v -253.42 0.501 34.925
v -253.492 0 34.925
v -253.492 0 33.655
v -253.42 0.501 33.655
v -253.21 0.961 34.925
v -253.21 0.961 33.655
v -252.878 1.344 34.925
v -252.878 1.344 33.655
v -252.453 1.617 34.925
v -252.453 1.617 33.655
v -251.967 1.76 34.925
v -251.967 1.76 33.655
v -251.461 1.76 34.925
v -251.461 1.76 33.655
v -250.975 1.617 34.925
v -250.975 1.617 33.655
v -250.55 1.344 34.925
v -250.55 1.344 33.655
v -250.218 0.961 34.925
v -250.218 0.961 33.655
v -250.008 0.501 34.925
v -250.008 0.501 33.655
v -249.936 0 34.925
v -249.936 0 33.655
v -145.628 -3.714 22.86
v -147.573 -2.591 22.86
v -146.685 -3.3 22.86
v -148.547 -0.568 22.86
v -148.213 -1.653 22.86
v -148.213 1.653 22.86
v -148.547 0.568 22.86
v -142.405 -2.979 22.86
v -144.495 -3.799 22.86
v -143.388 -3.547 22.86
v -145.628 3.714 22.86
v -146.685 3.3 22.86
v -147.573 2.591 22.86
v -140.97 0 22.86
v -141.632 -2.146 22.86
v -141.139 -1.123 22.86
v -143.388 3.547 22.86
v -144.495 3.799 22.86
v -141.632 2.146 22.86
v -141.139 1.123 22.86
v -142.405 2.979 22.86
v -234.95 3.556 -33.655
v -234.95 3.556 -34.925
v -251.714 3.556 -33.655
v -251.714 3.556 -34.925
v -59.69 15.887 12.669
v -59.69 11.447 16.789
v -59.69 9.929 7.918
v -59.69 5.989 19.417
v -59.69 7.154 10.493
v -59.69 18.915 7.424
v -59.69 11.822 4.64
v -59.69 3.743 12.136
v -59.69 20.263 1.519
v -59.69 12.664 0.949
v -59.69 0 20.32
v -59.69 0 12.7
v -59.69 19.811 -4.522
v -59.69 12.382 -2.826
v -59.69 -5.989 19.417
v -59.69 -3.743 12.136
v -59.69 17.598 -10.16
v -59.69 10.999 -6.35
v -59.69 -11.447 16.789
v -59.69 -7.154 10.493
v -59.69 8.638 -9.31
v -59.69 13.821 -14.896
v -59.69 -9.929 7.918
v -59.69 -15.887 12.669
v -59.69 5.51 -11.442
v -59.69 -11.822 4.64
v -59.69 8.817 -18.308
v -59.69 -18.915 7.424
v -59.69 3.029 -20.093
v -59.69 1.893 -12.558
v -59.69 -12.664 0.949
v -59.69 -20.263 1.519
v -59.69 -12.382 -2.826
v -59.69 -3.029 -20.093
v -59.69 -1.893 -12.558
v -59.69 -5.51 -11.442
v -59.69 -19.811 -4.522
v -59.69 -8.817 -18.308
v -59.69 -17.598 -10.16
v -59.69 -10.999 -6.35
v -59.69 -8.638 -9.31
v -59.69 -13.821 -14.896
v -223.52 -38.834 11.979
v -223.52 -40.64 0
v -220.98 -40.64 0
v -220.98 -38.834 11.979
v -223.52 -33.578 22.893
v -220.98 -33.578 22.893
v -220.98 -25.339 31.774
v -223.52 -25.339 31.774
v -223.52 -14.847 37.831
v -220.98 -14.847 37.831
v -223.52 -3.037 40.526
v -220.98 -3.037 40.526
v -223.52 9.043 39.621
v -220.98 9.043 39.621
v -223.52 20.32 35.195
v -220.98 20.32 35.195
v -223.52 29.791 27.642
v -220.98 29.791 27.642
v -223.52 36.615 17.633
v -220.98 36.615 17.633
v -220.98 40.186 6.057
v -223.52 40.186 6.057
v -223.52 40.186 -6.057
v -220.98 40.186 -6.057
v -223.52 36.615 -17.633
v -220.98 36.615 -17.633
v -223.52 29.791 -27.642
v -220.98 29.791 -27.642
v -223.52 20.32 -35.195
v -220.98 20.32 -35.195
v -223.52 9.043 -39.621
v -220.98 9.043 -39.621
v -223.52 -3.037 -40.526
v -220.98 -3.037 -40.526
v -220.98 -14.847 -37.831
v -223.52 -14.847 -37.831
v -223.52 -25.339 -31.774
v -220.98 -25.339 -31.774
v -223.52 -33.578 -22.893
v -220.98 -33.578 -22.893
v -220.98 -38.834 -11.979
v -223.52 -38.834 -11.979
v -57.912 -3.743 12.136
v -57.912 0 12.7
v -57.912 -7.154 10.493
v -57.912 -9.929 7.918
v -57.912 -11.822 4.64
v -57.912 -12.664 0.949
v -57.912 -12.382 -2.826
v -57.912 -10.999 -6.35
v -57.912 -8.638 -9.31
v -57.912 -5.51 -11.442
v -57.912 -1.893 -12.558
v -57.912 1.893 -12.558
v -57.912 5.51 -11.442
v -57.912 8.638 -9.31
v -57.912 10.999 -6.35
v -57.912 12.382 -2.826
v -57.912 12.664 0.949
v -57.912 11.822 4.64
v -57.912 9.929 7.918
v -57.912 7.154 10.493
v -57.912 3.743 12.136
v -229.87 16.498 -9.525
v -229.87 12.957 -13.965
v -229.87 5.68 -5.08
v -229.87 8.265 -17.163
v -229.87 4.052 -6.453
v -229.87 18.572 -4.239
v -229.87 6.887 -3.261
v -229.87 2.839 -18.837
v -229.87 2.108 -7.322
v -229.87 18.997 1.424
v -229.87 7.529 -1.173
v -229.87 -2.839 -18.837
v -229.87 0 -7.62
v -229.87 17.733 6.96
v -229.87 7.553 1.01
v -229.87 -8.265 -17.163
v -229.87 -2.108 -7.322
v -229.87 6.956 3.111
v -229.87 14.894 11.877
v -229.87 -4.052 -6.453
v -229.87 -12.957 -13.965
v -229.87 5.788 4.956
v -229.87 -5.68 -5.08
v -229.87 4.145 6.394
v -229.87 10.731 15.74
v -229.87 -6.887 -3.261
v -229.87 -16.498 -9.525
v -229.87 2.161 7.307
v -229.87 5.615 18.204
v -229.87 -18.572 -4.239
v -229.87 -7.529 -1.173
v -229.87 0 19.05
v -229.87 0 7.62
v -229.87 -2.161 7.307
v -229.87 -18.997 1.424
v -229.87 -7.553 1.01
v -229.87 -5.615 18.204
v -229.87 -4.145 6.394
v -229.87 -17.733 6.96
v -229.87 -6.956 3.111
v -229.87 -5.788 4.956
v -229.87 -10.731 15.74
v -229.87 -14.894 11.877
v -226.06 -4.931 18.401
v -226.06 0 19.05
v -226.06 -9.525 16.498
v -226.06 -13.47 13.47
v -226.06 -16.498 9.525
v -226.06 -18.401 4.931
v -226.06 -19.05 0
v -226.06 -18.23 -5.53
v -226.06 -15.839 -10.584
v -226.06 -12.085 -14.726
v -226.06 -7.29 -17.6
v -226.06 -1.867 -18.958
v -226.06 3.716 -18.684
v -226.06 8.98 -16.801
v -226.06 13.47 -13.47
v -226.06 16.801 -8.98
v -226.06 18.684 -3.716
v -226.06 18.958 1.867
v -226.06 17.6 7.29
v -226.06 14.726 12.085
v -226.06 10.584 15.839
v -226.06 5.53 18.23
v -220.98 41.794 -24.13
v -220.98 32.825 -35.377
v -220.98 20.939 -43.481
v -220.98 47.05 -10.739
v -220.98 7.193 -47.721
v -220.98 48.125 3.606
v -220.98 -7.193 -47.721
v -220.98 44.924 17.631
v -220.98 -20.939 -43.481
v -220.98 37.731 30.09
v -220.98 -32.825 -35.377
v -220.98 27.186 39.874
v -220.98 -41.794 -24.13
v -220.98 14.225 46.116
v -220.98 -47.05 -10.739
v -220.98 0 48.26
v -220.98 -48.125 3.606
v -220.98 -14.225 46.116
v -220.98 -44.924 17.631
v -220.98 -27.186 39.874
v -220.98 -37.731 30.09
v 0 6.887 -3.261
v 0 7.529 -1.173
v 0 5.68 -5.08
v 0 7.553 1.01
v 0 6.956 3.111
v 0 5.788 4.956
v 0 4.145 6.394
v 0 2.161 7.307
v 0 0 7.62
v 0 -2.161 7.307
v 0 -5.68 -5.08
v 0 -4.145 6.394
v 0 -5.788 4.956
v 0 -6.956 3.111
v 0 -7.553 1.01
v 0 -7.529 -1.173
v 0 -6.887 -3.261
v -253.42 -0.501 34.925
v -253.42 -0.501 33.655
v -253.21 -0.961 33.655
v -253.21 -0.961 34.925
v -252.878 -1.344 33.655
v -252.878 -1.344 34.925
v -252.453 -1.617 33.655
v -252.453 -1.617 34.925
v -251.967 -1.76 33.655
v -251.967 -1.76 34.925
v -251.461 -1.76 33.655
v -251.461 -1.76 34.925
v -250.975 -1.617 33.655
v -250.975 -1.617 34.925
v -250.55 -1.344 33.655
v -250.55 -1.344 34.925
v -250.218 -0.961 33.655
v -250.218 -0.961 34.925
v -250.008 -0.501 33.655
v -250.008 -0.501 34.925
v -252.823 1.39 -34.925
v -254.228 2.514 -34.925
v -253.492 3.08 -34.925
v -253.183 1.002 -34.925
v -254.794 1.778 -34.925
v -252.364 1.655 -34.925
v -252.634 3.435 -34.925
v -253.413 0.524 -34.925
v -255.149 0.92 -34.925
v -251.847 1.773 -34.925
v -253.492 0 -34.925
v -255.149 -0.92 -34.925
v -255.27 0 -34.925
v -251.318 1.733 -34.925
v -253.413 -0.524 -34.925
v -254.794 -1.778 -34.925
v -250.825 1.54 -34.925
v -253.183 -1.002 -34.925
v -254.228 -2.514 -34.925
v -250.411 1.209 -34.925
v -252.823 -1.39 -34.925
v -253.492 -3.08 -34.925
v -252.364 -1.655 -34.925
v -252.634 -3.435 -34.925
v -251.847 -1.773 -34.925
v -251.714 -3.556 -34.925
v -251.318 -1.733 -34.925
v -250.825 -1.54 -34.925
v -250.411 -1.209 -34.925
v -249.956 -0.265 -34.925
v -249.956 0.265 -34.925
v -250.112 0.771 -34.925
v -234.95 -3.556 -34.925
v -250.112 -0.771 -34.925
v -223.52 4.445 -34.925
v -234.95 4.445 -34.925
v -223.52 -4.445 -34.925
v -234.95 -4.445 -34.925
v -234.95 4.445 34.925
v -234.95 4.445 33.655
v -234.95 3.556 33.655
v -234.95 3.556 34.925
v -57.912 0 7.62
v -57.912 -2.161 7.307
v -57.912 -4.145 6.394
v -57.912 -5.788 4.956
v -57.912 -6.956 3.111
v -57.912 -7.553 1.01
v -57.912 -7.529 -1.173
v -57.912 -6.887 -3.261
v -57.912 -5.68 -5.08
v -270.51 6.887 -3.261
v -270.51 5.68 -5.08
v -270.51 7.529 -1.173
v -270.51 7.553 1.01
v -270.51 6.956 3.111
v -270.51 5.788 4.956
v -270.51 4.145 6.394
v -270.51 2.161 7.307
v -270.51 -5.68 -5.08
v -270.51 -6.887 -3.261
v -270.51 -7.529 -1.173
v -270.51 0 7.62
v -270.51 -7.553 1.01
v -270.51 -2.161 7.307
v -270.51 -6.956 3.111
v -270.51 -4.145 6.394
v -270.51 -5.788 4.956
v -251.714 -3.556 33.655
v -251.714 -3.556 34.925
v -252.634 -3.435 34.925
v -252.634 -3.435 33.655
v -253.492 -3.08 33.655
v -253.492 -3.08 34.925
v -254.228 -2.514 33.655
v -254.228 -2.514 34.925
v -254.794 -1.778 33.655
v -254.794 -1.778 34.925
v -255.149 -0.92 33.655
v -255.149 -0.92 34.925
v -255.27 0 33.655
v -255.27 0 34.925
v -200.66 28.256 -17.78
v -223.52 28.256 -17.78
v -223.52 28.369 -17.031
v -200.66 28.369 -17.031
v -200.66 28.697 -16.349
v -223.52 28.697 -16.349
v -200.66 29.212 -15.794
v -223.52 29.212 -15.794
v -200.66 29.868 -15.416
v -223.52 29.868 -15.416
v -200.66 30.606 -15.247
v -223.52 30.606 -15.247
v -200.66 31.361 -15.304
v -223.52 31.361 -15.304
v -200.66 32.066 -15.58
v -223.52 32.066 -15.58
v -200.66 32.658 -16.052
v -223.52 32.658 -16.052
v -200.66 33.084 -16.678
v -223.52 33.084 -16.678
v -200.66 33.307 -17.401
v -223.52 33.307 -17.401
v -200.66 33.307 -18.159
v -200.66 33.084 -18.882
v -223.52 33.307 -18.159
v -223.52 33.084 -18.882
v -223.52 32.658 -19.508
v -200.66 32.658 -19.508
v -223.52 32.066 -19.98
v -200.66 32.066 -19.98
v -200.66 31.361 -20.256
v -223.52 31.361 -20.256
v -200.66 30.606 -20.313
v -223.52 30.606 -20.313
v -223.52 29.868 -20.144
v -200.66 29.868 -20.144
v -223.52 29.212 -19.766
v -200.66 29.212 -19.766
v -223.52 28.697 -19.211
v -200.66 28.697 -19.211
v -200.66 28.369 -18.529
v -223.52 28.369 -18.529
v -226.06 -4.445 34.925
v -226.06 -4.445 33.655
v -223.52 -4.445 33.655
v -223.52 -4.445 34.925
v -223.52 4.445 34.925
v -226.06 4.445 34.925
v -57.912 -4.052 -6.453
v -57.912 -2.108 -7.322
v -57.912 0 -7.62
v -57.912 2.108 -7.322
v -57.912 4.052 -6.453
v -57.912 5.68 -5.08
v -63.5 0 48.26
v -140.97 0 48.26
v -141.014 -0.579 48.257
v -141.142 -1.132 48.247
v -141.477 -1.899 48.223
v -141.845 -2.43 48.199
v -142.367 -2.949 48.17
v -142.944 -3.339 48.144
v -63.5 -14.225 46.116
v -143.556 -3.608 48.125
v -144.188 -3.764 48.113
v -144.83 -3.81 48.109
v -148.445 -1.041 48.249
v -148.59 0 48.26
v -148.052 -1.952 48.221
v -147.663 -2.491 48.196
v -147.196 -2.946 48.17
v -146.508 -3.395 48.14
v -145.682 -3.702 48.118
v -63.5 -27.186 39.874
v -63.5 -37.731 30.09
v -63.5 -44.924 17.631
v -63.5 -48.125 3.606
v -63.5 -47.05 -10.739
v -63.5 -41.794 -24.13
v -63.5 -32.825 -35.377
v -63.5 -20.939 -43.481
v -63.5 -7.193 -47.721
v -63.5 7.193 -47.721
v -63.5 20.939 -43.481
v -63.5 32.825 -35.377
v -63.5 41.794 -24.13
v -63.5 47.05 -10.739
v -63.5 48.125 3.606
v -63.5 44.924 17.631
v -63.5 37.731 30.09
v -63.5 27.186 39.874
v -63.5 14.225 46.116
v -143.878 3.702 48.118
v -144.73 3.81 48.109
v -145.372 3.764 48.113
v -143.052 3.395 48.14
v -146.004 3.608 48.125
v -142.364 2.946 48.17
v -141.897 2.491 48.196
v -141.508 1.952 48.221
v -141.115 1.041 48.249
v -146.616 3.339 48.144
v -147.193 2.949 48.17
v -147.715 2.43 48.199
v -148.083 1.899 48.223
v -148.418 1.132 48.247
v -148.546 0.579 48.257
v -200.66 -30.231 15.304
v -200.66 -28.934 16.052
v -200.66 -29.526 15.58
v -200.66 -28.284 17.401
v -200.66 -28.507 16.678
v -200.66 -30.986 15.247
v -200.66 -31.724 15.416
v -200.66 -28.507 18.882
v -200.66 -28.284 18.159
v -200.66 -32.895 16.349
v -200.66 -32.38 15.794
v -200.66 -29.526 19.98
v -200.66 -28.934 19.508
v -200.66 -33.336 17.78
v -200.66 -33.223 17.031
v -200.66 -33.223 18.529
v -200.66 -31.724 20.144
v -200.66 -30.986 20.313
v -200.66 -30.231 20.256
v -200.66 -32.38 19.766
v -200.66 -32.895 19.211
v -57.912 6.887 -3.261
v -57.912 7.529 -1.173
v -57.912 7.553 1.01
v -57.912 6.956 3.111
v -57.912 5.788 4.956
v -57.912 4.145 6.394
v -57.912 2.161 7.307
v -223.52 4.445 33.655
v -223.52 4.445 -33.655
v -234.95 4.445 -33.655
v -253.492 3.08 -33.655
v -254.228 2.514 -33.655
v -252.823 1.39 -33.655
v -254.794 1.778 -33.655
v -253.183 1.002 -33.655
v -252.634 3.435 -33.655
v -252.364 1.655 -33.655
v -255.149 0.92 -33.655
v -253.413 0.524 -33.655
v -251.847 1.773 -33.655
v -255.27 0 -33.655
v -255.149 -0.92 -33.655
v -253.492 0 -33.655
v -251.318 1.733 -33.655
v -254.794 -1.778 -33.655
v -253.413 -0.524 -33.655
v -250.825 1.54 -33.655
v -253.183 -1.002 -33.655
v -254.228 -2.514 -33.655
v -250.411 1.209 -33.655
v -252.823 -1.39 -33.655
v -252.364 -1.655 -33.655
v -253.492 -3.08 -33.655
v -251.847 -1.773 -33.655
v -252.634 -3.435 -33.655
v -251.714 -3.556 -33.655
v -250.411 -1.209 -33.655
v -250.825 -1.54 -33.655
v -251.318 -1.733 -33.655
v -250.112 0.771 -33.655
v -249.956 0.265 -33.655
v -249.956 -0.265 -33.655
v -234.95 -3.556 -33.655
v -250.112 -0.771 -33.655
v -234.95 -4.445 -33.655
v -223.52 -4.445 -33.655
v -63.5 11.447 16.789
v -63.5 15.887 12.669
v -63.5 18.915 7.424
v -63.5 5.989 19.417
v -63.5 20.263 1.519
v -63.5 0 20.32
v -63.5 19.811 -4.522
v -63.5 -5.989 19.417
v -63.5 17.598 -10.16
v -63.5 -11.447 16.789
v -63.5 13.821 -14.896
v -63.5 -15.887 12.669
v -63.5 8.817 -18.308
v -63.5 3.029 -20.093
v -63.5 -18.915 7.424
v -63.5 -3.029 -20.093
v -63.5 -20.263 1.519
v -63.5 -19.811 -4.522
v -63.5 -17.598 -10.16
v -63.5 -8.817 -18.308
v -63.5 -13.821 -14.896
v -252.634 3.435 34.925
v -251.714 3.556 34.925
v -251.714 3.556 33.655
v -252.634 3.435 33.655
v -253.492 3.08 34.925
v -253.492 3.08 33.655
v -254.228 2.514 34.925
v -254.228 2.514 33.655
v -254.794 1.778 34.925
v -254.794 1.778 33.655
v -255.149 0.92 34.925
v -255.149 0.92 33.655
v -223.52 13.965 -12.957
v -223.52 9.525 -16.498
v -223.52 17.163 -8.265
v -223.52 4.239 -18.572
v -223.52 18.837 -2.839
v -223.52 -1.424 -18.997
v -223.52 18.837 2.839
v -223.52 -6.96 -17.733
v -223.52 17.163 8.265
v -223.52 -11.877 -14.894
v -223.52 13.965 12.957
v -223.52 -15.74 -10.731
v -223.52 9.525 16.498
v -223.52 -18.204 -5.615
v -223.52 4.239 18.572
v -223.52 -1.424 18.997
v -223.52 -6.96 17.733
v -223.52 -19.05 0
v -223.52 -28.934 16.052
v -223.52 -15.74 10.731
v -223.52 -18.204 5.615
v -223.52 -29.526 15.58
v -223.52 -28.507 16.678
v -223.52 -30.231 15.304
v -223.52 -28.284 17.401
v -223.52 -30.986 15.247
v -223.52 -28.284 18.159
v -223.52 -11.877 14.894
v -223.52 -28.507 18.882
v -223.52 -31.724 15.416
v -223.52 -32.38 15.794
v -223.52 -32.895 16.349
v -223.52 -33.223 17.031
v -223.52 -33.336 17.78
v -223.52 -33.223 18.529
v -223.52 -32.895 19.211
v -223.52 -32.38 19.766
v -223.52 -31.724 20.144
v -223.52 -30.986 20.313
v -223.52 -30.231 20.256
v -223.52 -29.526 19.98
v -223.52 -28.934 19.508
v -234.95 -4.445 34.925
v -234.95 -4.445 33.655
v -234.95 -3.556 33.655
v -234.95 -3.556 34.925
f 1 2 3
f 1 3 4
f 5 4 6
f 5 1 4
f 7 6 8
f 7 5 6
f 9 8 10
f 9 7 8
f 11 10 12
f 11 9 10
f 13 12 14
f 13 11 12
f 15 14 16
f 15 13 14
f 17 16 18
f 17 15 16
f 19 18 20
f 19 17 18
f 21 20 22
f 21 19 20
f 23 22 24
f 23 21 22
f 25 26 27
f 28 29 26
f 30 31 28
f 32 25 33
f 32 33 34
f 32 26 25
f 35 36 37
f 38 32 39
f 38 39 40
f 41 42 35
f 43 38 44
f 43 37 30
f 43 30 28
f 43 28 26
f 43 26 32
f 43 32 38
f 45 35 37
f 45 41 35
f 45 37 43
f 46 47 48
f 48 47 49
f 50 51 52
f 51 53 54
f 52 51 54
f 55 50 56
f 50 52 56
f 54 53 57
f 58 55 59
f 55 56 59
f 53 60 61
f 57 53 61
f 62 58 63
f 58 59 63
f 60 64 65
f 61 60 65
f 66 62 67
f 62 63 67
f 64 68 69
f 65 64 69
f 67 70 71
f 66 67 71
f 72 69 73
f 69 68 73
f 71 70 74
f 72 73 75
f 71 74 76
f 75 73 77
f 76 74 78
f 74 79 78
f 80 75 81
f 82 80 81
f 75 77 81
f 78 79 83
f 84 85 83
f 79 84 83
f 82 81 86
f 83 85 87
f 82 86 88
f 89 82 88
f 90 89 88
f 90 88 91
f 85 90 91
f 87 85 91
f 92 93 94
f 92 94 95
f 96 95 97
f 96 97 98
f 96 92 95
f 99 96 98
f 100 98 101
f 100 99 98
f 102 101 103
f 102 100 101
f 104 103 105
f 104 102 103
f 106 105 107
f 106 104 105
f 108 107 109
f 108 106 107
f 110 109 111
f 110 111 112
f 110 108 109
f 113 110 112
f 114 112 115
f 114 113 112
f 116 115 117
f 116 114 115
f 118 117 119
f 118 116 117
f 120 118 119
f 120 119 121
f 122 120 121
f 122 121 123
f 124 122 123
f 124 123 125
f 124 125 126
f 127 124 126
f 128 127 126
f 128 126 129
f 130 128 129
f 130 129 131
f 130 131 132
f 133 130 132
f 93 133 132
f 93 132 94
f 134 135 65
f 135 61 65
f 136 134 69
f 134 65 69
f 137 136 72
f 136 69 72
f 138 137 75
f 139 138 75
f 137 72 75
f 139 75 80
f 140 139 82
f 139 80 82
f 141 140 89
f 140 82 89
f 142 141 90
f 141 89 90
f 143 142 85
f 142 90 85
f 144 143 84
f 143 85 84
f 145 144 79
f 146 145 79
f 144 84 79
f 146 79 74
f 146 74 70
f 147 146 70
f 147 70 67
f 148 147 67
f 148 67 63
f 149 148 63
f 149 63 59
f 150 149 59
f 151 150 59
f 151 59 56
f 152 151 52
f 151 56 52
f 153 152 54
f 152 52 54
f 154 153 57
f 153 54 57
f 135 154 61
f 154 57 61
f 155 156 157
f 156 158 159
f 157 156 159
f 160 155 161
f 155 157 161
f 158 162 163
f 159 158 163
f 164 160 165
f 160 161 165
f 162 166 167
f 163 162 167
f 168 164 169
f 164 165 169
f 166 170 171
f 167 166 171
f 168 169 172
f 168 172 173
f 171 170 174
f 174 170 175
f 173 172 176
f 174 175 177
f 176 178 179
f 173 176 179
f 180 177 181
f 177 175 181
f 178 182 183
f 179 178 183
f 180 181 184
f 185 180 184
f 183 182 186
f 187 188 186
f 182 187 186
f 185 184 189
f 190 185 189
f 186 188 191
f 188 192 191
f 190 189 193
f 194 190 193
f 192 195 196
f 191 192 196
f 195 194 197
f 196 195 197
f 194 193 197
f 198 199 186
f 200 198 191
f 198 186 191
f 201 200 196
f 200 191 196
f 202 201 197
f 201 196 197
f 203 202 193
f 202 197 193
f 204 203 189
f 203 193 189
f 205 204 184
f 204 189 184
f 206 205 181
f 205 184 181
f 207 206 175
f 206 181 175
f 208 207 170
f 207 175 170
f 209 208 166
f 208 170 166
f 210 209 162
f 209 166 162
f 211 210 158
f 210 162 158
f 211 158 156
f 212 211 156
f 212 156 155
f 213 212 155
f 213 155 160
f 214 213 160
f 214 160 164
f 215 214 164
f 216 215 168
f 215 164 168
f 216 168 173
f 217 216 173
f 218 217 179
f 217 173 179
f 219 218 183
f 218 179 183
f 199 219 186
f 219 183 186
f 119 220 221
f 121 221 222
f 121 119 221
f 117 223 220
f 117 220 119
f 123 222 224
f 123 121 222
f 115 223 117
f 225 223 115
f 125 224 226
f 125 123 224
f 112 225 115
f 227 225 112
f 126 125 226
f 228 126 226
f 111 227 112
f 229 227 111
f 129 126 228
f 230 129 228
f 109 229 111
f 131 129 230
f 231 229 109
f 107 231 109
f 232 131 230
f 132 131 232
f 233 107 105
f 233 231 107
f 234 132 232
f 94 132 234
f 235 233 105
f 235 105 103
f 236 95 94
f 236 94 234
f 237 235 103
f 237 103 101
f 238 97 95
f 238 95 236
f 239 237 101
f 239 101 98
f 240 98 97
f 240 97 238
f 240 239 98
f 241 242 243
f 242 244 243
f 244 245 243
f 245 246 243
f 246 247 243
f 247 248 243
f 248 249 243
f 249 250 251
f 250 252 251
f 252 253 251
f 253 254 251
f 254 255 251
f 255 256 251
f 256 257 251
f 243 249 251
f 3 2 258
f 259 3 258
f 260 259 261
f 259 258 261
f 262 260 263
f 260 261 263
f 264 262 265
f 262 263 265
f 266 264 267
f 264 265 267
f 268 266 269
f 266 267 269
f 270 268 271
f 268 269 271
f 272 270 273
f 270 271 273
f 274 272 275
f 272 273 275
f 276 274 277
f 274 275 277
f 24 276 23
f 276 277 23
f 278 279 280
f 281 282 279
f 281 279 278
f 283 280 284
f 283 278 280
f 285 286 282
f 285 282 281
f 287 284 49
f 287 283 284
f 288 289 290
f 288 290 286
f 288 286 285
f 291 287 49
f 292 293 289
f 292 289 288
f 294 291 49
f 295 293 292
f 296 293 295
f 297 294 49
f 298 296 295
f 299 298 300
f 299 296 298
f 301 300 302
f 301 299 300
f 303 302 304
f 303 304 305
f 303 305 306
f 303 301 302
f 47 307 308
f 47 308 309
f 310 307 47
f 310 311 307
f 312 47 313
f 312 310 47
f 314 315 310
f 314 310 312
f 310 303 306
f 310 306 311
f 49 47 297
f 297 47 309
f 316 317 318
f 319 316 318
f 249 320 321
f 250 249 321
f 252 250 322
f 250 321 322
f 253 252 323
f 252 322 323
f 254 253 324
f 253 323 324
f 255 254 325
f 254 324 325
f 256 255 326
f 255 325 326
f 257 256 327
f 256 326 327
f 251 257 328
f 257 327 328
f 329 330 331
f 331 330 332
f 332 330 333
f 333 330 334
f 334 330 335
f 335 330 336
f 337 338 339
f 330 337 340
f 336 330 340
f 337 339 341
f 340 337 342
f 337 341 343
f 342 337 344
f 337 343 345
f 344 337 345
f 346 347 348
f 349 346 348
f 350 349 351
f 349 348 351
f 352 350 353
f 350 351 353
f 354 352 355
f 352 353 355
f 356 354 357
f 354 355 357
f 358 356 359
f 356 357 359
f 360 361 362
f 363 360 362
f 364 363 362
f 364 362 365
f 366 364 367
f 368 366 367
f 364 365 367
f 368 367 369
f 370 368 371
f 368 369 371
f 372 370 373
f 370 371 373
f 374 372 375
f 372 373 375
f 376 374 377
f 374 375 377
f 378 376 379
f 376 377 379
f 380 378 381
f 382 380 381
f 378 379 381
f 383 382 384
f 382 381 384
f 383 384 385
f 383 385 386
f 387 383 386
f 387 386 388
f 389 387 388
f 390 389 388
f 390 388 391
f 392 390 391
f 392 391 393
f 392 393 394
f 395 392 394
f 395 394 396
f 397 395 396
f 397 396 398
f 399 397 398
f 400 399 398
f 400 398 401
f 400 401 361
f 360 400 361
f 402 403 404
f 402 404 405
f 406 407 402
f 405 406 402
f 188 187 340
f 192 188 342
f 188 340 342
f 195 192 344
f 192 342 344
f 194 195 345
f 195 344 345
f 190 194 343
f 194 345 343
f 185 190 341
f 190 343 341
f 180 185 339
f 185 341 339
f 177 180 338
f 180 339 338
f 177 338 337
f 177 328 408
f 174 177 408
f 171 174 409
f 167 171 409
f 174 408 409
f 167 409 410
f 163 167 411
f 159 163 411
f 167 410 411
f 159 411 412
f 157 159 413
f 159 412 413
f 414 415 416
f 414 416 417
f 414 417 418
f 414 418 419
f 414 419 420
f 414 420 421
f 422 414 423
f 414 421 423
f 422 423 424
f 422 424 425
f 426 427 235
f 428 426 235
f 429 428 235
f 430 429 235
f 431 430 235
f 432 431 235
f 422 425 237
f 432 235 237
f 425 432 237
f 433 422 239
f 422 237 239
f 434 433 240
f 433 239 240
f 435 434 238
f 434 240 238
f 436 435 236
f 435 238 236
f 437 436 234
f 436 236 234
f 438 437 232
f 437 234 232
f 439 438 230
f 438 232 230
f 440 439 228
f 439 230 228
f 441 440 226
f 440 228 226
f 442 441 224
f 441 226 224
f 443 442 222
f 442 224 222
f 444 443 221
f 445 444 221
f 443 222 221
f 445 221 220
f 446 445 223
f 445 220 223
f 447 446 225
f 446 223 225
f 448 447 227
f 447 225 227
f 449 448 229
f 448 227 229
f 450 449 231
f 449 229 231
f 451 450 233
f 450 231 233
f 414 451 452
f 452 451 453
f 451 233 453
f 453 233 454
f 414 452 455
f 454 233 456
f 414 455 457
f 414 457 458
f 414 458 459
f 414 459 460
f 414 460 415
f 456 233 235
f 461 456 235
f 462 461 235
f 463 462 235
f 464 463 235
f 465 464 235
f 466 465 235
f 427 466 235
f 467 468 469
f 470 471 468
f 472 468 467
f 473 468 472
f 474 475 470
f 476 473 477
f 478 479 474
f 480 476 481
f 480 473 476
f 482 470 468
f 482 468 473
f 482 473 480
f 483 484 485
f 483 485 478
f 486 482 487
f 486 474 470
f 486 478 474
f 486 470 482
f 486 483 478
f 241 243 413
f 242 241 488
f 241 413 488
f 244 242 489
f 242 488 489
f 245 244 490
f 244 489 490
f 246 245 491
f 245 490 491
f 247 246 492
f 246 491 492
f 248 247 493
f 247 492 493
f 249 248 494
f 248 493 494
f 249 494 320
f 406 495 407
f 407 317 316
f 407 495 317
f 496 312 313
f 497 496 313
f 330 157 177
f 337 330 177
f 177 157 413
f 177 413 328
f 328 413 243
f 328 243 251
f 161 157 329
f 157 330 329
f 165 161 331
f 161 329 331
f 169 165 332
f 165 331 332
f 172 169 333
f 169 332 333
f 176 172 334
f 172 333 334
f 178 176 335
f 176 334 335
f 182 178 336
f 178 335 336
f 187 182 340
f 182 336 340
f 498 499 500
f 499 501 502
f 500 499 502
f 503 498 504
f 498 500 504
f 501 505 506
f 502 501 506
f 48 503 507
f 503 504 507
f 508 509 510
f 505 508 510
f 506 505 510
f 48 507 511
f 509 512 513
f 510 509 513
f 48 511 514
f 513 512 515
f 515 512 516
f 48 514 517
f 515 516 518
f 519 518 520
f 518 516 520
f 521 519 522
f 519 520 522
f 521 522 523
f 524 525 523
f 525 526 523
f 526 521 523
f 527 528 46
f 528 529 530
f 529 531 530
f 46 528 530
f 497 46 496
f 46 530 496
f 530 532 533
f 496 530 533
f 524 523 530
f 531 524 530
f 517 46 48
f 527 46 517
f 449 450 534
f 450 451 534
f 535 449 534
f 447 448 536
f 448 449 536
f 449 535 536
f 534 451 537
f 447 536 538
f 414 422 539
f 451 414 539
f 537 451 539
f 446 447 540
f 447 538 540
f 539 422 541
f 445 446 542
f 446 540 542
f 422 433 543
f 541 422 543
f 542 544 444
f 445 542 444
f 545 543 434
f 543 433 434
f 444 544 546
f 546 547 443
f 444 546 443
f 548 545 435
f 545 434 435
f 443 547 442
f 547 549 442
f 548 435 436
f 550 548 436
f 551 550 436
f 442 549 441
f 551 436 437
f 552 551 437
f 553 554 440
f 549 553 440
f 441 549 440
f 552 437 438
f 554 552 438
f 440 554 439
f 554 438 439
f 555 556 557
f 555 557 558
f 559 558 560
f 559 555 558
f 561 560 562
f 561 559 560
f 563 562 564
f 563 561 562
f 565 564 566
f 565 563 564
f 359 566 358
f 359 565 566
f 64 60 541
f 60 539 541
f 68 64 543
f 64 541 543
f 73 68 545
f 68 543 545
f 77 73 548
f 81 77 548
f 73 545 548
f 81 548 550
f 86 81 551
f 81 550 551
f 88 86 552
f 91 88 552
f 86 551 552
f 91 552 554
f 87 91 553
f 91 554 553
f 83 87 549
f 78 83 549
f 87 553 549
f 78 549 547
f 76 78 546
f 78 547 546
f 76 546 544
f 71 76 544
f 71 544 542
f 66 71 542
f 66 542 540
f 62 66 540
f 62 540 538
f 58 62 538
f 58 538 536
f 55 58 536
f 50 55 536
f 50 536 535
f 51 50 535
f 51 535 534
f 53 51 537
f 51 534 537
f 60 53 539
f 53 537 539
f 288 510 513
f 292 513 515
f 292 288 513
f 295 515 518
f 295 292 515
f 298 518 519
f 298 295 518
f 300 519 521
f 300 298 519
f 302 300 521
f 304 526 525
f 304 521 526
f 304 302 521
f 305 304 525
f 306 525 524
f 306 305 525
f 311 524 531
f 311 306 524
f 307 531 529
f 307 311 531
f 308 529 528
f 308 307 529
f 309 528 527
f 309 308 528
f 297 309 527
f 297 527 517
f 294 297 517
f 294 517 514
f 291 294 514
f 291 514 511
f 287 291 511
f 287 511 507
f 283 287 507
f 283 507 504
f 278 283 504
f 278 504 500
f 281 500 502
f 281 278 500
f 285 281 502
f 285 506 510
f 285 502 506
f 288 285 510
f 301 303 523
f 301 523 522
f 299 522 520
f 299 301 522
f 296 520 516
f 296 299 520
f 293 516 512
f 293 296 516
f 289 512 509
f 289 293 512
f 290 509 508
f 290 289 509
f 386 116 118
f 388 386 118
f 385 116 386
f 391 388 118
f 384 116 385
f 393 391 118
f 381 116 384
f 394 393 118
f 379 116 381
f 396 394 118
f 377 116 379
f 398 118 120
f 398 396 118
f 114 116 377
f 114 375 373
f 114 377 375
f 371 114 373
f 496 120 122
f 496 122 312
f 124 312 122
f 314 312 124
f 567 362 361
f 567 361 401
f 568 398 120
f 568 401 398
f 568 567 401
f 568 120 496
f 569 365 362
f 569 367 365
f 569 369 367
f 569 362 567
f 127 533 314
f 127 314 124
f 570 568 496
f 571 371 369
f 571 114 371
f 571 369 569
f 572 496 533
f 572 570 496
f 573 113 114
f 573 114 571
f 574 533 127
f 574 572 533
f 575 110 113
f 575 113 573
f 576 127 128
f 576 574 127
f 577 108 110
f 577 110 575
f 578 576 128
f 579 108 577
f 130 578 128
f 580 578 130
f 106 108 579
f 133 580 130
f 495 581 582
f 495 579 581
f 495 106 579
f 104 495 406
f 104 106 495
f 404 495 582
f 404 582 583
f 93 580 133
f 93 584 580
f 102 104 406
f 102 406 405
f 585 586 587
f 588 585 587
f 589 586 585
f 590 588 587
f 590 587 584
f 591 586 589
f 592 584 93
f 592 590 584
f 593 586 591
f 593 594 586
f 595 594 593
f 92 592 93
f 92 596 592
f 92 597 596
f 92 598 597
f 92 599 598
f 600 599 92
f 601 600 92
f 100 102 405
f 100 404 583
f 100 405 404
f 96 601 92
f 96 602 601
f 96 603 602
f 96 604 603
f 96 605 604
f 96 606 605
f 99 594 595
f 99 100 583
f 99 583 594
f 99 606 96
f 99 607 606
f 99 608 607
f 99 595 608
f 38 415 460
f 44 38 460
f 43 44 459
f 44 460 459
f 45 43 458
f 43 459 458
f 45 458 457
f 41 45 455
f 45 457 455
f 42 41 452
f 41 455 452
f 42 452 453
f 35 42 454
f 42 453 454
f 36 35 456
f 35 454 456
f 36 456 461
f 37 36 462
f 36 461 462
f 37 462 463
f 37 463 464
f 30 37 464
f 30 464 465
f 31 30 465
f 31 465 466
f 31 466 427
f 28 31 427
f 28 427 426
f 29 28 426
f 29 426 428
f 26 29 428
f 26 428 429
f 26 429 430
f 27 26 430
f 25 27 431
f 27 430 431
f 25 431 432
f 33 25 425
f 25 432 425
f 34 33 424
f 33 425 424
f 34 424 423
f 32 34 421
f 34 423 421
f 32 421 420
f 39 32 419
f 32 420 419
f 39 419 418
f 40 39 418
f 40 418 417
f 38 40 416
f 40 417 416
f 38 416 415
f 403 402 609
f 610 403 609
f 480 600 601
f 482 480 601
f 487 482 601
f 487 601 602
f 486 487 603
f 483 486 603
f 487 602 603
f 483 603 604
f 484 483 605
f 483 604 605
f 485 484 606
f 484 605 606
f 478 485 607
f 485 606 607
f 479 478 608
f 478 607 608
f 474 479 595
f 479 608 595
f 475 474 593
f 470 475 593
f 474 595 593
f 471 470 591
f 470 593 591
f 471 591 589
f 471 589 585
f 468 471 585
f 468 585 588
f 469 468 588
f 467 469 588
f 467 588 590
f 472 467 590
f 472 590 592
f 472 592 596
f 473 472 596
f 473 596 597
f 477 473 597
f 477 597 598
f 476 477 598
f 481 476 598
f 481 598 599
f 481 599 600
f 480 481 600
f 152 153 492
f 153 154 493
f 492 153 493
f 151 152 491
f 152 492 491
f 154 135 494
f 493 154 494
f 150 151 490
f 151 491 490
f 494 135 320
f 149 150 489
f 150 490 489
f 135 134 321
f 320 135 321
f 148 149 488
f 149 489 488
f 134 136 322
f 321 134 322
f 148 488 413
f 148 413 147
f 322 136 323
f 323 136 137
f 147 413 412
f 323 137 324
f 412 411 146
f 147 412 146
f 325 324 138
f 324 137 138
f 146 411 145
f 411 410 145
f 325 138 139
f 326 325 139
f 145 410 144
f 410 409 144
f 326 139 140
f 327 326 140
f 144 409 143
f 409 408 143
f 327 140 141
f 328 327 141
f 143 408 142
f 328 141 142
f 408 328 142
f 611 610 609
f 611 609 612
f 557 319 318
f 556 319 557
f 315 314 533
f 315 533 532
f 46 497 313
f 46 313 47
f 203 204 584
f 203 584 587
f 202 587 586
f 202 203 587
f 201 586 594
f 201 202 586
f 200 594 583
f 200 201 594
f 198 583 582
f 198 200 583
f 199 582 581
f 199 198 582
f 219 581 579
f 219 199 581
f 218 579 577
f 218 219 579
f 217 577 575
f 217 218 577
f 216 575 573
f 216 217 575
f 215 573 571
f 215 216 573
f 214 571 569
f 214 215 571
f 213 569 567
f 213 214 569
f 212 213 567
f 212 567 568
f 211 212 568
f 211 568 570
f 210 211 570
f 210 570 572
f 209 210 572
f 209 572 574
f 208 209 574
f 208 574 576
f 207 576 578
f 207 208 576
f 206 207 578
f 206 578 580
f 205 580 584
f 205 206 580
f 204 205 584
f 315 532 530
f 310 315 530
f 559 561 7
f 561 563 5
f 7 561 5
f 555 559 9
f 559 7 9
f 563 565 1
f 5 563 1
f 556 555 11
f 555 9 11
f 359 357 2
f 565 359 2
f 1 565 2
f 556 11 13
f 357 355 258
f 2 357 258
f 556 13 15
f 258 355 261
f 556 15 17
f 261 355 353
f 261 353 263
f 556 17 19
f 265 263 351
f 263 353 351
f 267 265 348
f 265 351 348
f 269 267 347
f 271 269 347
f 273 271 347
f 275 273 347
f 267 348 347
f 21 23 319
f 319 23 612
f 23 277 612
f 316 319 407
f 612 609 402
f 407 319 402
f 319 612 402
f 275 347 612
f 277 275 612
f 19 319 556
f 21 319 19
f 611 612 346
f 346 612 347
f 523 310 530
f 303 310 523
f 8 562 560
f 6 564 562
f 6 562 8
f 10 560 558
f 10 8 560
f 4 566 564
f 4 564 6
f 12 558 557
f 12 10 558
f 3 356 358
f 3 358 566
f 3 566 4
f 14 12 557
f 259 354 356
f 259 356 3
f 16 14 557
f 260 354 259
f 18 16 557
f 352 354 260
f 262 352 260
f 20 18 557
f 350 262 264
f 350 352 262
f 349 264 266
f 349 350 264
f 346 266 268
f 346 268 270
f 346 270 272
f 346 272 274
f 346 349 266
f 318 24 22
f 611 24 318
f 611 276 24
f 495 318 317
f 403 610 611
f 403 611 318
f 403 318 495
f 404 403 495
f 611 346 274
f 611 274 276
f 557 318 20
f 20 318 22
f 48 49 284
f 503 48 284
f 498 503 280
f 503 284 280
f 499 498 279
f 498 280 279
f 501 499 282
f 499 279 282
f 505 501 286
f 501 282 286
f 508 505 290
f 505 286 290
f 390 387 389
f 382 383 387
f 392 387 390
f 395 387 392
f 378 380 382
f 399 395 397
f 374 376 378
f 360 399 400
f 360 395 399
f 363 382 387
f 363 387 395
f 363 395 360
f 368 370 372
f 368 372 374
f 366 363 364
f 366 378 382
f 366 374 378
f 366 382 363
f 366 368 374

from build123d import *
from build123d import SkipClean  # not in build123d's __all__

# Parameters (mm, degrees)
F5_DEPTH         = 1.27
F5_COPIES2_COUNT = 2
F7_R             = 3.81
F8_DEPTH         = 25.4
F9_R             = 2.54
F10_DEPTH        = 25.4
F9_R_2           = 40.64
F9_W             = 8.89
F9_H             = 1.27
F9_R_3           = 19.05
F11_DEPTH        = 2.54
F12_R            = 48.26
F12_R_2          = 40.64
F13_DEPTH        = 5.08
F15_DEPTH        = 270.51


# Not quite as in the source:
# - after a boolean that leaves OpenCascade's solid faulty, fix() repairs it
# - a pattern or mirror of a feature is missing from the dataset's text; its kind, count and spacing are read off the source's solid


with BuildPart() as f1:
    # F0 (on Front) → F1 (revolve)
    with BuildSketch(Plane.XZ):
        Polygon((-270.51, 0), (0, 0), (0, 7.62), (-57.912, 7.62), (-57.912, 12.7), (-59.69, 12.7), (-59.69, 20.32), (-63.5, 20.32), (-63.5, 48.26), (-226.06, 48.26), (-226.06, 19.05), (-229.87, 19.05), (-229.87, 7.62), (-270.51, 7.62), align=None)
    revolve(axis=Axis((-130.6665660813, 0, 0), (1, 0, 0)))

    # F4 (on offset) → F5 (join)
    with BuildSketch(Plane.XY.offset(34.925)):
        with BuildLine():
            Line((-226.06, 0), (-226.06, 4.445))
            Line((-226.06, 4.445), (-234.95, 4.445))
            Line((-234.95, 4.445), (-234.95, 3.556))
            Line((-234.95, 3.556), (-251.714, 3.556))
            ThreePointArc((-251.714, 3.556), (-254.2284717139, 2.5144717139), (-255.27, 0))
            Line((-255.27, 0), (-253.492, 0))
            ThreePointArc((-253.492, 0), (-251.714, 1.778), (-249.936, 0))
            Line((-249.936, 0), (-226.06, 0))
        make_face()
    f5 = extrude(amount=-F5_DEPTH)

    # F5_copies: F5 across plane
    add(f5.mirror(Plane(origin=(0, 0, 0), x_dir=(-1, 0, 0), z_dir=(0, 0, -1))), clean=False)

    # F5_copies1: F5 across plane
    with SkipClean():  # cleaning this boolean's faces spoils the solid; the shape is the same uncleaned
        add(f5.mirror(Plane(origin=(0, 0, 0), x_dir=(0, 0, -1), z_dir=(0, -1, 0))), clean=False)

    # F5_copies2: F5 ×2 about axis
    f5_copies2_axis = Axis((0, 0, 0), (1, 0, 0))
    with SkipClean():  # cleaning this boolean's faces spoils the solid; the shape is the same uncleaned
        for i in range(1, F5_COPIES2_COUNT):
            add(f5.rotate(f5_copies2_axis, i * 360 / F5_COPIES2_COUNT), clean=False)

    # F7 (on offset) → F8 (cut)
    with BuildSketch(Plane.XY.offset(48.26)):
        with Locations((-144.78, 0)):
            Circle(F7_R)
    extrude(amount=-F8_DEPTH, mode=Mode.SUBTRACT)

    # F9 (on face) → F10 (cut)
    with BuildSketch(Plane(origin=(-226.06, 0, 0), x_dir=(0, -1, 0), z_dir=(-1, 0, 0))):
        with Locations((30.7958633586, 17.78)):
            Circle(F9_R)
        with Locations((-30.7958633586, -17.78)):
            Circle(F9_R)
    extrude(amount=-F10_DEPTH, mode=Mode.SUBTRACT)

    # F9 (on face) → F11 (cut)
    with BuildSketch(Plane(origin=(-226.06, 0, 0), x_dir=(0, -1, 0), z_dir=(-1, 0, 0))):
        Circle(F9_R_2)
        with Locations((-30.7958633586, -17.78)):
            Circle(F9_R, mode=Mode.SUBTRACT)
        with Locations((0, -34.29)):
            Rectangle(F9_W, F9_H, mode=Mode.SUBTRACT)
        Circle(F9_R_3, mode=Mode.SUBTRACT)
        with Locations((30.7958633586, 17.78)):
            Circle(F9_R, mode=Mode.SUBTRACT)
        with Locations((0, 34.29)):
            Rectangle(F9_W, F9_H, mode=Mode.SUBTRACT)
    with SkipClean():  # cleaning this boolean's faces spoils the solid; the shape is the same uncleaned
        extrude(amount=-F11_DEPTH, mode=Mode.SUBTRACT)

    # F12 (on face) → F13 (cut)
    with BuildSketch(Plane(origin=(-226.06, 0, 0), x_dir=(0, -1, 0), z_dir=(-1, 0, 0))):
        Circle(F12_R)
        Circle(F12_R_2, mode=Mode.SUBTRACT)
    extrude(amount=-F13_DEPTH, mode=Mode.SUBTRACT)

    add(f1.part.fix(), mode=Mode.REPLACE)

    # F14 (on face) → F15 (cut, through all)
    with BuildSketch(Plane.YZ):
        with BuildLine():
            Line((5.6796126628, -5.08), (-5.6796126628, -5.08))
            ThreePointArc((-5.6796126628, -5.08), (0, -7.62), (5.6796126628, -5.08))
        make_face()
    extrude(amount=-F15_DEPTH, mode=Mode.SUBTRACT)

    add(f1.part.fix(), mode=Mode.REPLACE)


solid = f1.part
